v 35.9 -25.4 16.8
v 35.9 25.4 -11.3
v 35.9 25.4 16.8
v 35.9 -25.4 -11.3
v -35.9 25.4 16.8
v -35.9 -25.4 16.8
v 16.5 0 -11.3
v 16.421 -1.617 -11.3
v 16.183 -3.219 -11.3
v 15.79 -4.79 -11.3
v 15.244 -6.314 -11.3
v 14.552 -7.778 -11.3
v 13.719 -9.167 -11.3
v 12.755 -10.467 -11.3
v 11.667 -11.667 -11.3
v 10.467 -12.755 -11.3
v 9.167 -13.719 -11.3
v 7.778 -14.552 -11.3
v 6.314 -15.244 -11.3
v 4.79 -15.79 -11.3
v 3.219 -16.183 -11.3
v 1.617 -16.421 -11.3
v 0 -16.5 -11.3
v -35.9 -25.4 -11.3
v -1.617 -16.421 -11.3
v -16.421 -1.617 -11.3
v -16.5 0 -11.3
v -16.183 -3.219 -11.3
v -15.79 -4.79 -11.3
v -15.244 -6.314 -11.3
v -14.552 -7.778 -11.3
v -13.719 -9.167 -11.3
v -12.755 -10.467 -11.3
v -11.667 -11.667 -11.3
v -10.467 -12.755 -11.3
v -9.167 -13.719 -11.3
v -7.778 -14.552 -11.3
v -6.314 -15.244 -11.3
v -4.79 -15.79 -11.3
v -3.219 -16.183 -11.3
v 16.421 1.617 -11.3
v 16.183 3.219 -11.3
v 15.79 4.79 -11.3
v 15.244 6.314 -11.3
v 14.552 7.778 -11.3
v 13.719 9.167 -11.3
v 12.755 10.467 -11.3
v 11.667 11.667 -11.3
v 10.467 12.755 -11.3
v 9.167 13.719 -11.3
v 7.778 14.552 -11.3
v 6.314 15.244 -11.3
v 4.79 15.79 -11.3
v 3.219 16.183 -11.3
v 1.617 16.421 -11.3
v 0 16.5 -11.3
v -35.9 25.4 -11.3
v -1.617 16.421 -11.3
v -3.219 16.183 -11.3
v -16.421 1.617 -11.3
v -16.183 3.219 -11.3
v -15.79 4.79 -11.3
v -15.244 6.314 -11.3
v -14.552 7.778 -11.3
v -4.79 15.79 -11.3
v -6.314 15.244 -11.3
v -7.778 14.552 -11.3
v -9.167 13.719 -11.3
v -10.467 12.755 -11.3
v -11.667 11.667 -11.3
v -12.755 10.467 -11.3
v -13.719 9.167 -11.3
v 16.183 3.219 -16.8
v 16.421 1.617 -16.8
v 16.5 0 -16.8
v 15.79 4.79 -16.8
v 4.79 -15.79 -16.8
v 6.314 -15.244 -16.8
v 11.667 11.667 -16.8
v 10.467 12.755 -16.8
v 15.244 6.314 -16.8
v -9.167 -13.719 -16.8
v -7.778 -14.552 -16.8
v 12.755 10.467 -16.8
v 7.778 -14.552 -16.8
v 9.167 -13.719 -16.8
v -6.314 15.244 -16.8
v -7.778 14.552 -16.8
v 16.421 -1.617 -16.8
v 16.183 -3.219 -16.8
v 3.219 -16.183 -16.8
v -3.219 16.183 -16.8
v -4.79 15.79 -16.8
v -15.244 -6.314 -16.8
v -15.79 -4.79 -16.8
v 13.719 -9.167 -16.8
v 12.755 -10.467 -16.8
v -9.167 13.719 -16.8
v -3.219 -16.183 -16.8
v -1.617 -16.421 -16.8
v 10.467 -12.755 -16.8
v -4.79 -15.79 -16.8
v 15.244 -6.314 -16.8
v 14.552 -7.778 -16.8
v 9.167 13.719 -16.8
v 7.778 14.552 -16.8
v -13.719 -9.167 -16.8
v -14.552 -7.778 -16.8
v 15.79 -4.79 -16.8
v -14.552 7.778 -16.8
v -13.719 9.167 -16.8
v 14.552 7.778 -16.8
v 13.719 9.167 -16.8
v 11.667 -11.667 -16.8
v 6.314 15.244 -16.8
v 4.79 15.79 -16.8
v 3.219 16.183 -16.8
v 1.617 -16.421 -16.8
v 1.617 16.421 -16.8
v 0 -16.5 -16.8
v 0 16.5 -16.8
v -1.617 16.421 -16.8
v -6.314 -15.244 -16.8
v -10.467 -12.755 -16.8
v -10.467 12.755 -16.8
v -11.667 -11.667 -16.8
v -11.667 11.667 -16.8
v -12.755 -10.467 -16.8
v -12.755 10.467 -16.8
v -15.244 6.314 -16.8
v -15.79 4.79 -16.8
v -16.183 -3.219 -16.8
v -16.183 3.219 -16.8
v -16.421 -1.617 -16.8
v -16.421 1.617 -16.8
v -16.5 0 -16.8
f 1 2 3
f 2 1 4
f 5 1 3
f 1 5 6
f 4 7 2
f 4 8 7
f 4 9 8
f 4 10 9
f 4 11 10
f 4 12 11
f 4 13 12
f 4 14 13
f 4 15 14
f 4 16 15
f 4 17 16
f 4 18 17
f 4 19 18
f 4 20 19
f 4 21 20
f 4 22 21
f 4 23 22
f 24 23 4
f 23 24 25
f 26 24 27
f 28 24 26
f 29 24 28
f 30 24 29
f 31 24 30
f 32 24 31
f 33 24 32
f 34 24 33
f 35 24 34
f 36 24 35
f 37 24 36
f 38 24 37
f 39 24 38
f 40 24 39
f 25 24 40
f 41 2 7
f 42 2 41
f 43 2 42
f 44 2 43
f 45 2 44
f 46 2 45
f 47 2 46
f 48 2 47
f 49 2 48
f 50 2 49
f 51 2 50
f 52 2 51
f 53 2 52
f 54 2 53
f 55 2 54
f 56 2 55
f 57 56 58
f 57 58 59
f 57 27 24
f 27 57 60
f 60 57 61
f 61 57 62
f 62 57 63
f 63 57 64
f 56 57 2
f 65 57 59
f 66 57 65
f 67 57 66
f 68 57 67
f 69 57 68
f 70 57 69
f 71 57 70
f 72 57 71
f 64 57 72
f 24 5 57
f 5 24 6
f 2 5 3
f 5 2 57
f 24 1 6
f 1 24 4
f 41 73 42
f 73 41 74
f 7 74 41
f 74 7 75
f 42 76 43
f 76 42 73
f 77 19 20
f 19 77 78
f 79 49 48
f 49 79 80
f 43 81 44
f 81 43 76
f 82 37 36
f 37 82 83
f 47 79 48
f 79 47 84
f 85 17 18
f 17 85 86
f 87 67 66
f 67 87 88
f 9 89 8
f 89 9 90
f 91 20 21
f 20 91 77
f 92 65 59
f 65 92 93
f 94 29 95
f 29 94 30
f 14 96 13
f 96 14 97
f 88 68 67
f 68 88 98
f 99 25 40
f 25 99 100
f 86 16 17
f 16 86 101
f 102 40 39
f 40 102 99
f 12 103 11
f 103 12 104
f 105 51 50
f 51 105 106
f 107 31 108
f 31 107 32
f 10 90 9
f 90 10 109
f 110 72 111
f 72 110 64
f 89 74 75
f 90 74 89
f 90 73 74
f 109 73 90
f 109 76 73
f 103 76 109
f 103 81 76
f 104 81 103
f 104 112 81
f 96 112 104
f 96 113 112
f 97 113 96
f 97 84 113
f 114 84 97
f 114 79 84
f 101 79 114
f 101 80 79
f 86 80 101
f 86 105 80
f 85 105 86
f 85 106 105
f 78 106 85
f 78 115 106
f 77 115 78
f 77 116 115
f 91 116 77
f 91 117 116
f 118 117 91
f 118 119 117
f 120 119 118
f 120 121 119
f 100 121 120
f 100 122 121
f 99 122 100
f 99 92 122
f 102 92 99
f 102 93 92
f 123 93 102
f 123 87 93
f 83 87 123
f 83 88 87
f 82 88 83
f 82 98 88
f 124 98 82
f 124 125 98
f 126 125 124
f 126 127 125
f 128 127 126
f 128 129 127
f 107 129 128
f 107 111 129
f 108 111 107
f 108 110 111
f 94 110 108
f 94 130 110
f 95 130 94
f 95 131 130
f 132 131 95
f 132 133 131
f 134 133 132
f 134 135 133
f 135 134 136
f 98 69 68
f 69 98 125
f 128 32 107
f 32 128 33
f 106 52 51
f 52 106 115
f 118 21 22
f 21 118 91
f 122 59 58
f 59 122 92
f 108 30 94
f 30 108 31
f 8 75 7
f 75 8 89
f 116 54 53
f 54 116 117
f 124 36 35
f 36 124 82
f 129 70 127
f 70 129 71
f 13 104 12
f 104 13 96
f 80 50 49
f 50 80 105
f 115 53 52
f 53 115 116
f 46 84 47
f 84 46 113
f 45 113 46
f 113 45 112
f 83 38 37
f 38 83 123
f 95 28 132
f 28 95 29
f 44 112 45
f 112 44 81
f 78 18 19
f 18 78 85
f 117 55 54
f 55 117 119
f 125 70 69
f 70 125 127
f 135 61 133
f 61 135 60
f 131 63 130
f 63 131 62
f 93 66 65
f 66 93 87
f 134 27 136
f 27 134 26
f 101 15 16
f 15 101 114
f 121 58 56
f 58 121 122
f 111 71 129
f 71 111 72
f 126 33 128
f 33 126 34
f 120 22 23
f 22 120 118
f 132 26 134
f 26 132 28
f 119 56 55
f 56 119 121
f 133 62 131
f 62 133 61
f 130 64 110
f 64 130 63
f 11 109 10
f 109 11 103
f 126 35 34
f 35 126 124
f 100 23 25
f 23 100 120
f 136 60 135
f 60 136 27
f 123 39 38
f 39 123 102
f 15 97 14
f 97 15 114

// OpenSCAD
// Boat Puck — GoPro HERO9–13 housing
// Doctrine: housing cavity = camera positive (mold clearance = microns).
// Units: mm
//
// camera_positive()     — exact published chassis envelope
// lens_boss()           — stock protective lens protrusion (GPS pocket)
// camera_with_lens()    — body box + front lens boss
// print_slip_dummy()    — optional −0.15 mm/side for FDM drop-fit only

/* [Camera positive = cavity] */
cam_W = 71.8;
cam_H = 50.8;
cam_D = 33.6;

/* [Stock protective lens — GPS pocket] */
// Community / accessory fit (medium confidence) — caliper before PCB freeze
lens_OD = 33.0;          // approx outer diameter
lens_square = 31.5;      // alternate square footprint listing
lens_protrusion = 5.5;   // past front face; range 5.0–6.0
// Body depth behind lens tip ≈ cam_D - lens_protrusion

/* [Optional FDM slip — NOT cavity uncertainty] */
slip_per_side = 0.15;
slip_depth_total = 0.30;

$fn = 64;

module camera_body_box() {
  // Envelope includes lens in published D; for boss modeling we optionally
  // shorten the box so the lens cylinder is explicit at the front.
  cube([cam_W, cam_H, cam_D], center = true);
}

module camera_body_behind_lens() {
  // Body only: total D minus lens protrusion (lens tip at -Z extreme)
  d = cam_D - lens_protrusion;
  translate([0, 0, lens_protrusion / 2])
    cube([cam_W, cam_H, d], center = true);
}

module lens_boss() {
  // Front protective lens stick-out — housing tunnel / GPS antenna well
  // −Z is lens / housing glass direction
  translate([0, 0, -cam_D / 2 + lens_protrusion / 2])
    cylinder(h = lens_protrusion, d = lens_OD, center = true);
}

module camera_with_lens() {
  union() {
    camera_body_behind_lens();
    lens_boss();
  }
}

module gps_antenna_keep_in() {
  // Usable antenna volume inside lens tunnel (design target)
  translate([0, 0, -cam_D / 2 + 5.5 / 2])
    cylinder(h = 5.5, d = 30.0, center = true);
}

module print_slip_dummy() {
  cube([
    cam_W - 2 * slip_per_side,
    cam_H - 2 * slip_per_side,
    cam_D - slip_depth_total
  ], center = true);
}

module marked_positive() {
  difference() {
    camera_with_lens();
    translate([0, cam_H / 2 - 1.2, -cam_D / 2 + lens_protrusion + 1.0])
      cube([10, 2.4, 2], center = true);
  }
}

// Default preview: body + lens boss (GPS pocket highlighted)
color([0.2, 0.55, 0.95, 0.45]) camera_body_behind_lens();
color([0.95, 0.55, 0.15, 0.75]) lens_boss();
color([0.2, 0.8, 0.3, 0.35]) gps_antenna_keep_in();

// Uncomment to export STL:
// marked_positive();
// camera_with_lens();
// print_slip_dummy();

echo(str("CAVITY = CAMERA positive mm: ", cam_W, " x ", cam_H, " x ", cam_D));
echo(str("LENS protrusion mm: ", lens_protrusion, "  OD: ", lens_OD));
echo(str("GPS pocket target: Ø30 x 5.5 mm"));
